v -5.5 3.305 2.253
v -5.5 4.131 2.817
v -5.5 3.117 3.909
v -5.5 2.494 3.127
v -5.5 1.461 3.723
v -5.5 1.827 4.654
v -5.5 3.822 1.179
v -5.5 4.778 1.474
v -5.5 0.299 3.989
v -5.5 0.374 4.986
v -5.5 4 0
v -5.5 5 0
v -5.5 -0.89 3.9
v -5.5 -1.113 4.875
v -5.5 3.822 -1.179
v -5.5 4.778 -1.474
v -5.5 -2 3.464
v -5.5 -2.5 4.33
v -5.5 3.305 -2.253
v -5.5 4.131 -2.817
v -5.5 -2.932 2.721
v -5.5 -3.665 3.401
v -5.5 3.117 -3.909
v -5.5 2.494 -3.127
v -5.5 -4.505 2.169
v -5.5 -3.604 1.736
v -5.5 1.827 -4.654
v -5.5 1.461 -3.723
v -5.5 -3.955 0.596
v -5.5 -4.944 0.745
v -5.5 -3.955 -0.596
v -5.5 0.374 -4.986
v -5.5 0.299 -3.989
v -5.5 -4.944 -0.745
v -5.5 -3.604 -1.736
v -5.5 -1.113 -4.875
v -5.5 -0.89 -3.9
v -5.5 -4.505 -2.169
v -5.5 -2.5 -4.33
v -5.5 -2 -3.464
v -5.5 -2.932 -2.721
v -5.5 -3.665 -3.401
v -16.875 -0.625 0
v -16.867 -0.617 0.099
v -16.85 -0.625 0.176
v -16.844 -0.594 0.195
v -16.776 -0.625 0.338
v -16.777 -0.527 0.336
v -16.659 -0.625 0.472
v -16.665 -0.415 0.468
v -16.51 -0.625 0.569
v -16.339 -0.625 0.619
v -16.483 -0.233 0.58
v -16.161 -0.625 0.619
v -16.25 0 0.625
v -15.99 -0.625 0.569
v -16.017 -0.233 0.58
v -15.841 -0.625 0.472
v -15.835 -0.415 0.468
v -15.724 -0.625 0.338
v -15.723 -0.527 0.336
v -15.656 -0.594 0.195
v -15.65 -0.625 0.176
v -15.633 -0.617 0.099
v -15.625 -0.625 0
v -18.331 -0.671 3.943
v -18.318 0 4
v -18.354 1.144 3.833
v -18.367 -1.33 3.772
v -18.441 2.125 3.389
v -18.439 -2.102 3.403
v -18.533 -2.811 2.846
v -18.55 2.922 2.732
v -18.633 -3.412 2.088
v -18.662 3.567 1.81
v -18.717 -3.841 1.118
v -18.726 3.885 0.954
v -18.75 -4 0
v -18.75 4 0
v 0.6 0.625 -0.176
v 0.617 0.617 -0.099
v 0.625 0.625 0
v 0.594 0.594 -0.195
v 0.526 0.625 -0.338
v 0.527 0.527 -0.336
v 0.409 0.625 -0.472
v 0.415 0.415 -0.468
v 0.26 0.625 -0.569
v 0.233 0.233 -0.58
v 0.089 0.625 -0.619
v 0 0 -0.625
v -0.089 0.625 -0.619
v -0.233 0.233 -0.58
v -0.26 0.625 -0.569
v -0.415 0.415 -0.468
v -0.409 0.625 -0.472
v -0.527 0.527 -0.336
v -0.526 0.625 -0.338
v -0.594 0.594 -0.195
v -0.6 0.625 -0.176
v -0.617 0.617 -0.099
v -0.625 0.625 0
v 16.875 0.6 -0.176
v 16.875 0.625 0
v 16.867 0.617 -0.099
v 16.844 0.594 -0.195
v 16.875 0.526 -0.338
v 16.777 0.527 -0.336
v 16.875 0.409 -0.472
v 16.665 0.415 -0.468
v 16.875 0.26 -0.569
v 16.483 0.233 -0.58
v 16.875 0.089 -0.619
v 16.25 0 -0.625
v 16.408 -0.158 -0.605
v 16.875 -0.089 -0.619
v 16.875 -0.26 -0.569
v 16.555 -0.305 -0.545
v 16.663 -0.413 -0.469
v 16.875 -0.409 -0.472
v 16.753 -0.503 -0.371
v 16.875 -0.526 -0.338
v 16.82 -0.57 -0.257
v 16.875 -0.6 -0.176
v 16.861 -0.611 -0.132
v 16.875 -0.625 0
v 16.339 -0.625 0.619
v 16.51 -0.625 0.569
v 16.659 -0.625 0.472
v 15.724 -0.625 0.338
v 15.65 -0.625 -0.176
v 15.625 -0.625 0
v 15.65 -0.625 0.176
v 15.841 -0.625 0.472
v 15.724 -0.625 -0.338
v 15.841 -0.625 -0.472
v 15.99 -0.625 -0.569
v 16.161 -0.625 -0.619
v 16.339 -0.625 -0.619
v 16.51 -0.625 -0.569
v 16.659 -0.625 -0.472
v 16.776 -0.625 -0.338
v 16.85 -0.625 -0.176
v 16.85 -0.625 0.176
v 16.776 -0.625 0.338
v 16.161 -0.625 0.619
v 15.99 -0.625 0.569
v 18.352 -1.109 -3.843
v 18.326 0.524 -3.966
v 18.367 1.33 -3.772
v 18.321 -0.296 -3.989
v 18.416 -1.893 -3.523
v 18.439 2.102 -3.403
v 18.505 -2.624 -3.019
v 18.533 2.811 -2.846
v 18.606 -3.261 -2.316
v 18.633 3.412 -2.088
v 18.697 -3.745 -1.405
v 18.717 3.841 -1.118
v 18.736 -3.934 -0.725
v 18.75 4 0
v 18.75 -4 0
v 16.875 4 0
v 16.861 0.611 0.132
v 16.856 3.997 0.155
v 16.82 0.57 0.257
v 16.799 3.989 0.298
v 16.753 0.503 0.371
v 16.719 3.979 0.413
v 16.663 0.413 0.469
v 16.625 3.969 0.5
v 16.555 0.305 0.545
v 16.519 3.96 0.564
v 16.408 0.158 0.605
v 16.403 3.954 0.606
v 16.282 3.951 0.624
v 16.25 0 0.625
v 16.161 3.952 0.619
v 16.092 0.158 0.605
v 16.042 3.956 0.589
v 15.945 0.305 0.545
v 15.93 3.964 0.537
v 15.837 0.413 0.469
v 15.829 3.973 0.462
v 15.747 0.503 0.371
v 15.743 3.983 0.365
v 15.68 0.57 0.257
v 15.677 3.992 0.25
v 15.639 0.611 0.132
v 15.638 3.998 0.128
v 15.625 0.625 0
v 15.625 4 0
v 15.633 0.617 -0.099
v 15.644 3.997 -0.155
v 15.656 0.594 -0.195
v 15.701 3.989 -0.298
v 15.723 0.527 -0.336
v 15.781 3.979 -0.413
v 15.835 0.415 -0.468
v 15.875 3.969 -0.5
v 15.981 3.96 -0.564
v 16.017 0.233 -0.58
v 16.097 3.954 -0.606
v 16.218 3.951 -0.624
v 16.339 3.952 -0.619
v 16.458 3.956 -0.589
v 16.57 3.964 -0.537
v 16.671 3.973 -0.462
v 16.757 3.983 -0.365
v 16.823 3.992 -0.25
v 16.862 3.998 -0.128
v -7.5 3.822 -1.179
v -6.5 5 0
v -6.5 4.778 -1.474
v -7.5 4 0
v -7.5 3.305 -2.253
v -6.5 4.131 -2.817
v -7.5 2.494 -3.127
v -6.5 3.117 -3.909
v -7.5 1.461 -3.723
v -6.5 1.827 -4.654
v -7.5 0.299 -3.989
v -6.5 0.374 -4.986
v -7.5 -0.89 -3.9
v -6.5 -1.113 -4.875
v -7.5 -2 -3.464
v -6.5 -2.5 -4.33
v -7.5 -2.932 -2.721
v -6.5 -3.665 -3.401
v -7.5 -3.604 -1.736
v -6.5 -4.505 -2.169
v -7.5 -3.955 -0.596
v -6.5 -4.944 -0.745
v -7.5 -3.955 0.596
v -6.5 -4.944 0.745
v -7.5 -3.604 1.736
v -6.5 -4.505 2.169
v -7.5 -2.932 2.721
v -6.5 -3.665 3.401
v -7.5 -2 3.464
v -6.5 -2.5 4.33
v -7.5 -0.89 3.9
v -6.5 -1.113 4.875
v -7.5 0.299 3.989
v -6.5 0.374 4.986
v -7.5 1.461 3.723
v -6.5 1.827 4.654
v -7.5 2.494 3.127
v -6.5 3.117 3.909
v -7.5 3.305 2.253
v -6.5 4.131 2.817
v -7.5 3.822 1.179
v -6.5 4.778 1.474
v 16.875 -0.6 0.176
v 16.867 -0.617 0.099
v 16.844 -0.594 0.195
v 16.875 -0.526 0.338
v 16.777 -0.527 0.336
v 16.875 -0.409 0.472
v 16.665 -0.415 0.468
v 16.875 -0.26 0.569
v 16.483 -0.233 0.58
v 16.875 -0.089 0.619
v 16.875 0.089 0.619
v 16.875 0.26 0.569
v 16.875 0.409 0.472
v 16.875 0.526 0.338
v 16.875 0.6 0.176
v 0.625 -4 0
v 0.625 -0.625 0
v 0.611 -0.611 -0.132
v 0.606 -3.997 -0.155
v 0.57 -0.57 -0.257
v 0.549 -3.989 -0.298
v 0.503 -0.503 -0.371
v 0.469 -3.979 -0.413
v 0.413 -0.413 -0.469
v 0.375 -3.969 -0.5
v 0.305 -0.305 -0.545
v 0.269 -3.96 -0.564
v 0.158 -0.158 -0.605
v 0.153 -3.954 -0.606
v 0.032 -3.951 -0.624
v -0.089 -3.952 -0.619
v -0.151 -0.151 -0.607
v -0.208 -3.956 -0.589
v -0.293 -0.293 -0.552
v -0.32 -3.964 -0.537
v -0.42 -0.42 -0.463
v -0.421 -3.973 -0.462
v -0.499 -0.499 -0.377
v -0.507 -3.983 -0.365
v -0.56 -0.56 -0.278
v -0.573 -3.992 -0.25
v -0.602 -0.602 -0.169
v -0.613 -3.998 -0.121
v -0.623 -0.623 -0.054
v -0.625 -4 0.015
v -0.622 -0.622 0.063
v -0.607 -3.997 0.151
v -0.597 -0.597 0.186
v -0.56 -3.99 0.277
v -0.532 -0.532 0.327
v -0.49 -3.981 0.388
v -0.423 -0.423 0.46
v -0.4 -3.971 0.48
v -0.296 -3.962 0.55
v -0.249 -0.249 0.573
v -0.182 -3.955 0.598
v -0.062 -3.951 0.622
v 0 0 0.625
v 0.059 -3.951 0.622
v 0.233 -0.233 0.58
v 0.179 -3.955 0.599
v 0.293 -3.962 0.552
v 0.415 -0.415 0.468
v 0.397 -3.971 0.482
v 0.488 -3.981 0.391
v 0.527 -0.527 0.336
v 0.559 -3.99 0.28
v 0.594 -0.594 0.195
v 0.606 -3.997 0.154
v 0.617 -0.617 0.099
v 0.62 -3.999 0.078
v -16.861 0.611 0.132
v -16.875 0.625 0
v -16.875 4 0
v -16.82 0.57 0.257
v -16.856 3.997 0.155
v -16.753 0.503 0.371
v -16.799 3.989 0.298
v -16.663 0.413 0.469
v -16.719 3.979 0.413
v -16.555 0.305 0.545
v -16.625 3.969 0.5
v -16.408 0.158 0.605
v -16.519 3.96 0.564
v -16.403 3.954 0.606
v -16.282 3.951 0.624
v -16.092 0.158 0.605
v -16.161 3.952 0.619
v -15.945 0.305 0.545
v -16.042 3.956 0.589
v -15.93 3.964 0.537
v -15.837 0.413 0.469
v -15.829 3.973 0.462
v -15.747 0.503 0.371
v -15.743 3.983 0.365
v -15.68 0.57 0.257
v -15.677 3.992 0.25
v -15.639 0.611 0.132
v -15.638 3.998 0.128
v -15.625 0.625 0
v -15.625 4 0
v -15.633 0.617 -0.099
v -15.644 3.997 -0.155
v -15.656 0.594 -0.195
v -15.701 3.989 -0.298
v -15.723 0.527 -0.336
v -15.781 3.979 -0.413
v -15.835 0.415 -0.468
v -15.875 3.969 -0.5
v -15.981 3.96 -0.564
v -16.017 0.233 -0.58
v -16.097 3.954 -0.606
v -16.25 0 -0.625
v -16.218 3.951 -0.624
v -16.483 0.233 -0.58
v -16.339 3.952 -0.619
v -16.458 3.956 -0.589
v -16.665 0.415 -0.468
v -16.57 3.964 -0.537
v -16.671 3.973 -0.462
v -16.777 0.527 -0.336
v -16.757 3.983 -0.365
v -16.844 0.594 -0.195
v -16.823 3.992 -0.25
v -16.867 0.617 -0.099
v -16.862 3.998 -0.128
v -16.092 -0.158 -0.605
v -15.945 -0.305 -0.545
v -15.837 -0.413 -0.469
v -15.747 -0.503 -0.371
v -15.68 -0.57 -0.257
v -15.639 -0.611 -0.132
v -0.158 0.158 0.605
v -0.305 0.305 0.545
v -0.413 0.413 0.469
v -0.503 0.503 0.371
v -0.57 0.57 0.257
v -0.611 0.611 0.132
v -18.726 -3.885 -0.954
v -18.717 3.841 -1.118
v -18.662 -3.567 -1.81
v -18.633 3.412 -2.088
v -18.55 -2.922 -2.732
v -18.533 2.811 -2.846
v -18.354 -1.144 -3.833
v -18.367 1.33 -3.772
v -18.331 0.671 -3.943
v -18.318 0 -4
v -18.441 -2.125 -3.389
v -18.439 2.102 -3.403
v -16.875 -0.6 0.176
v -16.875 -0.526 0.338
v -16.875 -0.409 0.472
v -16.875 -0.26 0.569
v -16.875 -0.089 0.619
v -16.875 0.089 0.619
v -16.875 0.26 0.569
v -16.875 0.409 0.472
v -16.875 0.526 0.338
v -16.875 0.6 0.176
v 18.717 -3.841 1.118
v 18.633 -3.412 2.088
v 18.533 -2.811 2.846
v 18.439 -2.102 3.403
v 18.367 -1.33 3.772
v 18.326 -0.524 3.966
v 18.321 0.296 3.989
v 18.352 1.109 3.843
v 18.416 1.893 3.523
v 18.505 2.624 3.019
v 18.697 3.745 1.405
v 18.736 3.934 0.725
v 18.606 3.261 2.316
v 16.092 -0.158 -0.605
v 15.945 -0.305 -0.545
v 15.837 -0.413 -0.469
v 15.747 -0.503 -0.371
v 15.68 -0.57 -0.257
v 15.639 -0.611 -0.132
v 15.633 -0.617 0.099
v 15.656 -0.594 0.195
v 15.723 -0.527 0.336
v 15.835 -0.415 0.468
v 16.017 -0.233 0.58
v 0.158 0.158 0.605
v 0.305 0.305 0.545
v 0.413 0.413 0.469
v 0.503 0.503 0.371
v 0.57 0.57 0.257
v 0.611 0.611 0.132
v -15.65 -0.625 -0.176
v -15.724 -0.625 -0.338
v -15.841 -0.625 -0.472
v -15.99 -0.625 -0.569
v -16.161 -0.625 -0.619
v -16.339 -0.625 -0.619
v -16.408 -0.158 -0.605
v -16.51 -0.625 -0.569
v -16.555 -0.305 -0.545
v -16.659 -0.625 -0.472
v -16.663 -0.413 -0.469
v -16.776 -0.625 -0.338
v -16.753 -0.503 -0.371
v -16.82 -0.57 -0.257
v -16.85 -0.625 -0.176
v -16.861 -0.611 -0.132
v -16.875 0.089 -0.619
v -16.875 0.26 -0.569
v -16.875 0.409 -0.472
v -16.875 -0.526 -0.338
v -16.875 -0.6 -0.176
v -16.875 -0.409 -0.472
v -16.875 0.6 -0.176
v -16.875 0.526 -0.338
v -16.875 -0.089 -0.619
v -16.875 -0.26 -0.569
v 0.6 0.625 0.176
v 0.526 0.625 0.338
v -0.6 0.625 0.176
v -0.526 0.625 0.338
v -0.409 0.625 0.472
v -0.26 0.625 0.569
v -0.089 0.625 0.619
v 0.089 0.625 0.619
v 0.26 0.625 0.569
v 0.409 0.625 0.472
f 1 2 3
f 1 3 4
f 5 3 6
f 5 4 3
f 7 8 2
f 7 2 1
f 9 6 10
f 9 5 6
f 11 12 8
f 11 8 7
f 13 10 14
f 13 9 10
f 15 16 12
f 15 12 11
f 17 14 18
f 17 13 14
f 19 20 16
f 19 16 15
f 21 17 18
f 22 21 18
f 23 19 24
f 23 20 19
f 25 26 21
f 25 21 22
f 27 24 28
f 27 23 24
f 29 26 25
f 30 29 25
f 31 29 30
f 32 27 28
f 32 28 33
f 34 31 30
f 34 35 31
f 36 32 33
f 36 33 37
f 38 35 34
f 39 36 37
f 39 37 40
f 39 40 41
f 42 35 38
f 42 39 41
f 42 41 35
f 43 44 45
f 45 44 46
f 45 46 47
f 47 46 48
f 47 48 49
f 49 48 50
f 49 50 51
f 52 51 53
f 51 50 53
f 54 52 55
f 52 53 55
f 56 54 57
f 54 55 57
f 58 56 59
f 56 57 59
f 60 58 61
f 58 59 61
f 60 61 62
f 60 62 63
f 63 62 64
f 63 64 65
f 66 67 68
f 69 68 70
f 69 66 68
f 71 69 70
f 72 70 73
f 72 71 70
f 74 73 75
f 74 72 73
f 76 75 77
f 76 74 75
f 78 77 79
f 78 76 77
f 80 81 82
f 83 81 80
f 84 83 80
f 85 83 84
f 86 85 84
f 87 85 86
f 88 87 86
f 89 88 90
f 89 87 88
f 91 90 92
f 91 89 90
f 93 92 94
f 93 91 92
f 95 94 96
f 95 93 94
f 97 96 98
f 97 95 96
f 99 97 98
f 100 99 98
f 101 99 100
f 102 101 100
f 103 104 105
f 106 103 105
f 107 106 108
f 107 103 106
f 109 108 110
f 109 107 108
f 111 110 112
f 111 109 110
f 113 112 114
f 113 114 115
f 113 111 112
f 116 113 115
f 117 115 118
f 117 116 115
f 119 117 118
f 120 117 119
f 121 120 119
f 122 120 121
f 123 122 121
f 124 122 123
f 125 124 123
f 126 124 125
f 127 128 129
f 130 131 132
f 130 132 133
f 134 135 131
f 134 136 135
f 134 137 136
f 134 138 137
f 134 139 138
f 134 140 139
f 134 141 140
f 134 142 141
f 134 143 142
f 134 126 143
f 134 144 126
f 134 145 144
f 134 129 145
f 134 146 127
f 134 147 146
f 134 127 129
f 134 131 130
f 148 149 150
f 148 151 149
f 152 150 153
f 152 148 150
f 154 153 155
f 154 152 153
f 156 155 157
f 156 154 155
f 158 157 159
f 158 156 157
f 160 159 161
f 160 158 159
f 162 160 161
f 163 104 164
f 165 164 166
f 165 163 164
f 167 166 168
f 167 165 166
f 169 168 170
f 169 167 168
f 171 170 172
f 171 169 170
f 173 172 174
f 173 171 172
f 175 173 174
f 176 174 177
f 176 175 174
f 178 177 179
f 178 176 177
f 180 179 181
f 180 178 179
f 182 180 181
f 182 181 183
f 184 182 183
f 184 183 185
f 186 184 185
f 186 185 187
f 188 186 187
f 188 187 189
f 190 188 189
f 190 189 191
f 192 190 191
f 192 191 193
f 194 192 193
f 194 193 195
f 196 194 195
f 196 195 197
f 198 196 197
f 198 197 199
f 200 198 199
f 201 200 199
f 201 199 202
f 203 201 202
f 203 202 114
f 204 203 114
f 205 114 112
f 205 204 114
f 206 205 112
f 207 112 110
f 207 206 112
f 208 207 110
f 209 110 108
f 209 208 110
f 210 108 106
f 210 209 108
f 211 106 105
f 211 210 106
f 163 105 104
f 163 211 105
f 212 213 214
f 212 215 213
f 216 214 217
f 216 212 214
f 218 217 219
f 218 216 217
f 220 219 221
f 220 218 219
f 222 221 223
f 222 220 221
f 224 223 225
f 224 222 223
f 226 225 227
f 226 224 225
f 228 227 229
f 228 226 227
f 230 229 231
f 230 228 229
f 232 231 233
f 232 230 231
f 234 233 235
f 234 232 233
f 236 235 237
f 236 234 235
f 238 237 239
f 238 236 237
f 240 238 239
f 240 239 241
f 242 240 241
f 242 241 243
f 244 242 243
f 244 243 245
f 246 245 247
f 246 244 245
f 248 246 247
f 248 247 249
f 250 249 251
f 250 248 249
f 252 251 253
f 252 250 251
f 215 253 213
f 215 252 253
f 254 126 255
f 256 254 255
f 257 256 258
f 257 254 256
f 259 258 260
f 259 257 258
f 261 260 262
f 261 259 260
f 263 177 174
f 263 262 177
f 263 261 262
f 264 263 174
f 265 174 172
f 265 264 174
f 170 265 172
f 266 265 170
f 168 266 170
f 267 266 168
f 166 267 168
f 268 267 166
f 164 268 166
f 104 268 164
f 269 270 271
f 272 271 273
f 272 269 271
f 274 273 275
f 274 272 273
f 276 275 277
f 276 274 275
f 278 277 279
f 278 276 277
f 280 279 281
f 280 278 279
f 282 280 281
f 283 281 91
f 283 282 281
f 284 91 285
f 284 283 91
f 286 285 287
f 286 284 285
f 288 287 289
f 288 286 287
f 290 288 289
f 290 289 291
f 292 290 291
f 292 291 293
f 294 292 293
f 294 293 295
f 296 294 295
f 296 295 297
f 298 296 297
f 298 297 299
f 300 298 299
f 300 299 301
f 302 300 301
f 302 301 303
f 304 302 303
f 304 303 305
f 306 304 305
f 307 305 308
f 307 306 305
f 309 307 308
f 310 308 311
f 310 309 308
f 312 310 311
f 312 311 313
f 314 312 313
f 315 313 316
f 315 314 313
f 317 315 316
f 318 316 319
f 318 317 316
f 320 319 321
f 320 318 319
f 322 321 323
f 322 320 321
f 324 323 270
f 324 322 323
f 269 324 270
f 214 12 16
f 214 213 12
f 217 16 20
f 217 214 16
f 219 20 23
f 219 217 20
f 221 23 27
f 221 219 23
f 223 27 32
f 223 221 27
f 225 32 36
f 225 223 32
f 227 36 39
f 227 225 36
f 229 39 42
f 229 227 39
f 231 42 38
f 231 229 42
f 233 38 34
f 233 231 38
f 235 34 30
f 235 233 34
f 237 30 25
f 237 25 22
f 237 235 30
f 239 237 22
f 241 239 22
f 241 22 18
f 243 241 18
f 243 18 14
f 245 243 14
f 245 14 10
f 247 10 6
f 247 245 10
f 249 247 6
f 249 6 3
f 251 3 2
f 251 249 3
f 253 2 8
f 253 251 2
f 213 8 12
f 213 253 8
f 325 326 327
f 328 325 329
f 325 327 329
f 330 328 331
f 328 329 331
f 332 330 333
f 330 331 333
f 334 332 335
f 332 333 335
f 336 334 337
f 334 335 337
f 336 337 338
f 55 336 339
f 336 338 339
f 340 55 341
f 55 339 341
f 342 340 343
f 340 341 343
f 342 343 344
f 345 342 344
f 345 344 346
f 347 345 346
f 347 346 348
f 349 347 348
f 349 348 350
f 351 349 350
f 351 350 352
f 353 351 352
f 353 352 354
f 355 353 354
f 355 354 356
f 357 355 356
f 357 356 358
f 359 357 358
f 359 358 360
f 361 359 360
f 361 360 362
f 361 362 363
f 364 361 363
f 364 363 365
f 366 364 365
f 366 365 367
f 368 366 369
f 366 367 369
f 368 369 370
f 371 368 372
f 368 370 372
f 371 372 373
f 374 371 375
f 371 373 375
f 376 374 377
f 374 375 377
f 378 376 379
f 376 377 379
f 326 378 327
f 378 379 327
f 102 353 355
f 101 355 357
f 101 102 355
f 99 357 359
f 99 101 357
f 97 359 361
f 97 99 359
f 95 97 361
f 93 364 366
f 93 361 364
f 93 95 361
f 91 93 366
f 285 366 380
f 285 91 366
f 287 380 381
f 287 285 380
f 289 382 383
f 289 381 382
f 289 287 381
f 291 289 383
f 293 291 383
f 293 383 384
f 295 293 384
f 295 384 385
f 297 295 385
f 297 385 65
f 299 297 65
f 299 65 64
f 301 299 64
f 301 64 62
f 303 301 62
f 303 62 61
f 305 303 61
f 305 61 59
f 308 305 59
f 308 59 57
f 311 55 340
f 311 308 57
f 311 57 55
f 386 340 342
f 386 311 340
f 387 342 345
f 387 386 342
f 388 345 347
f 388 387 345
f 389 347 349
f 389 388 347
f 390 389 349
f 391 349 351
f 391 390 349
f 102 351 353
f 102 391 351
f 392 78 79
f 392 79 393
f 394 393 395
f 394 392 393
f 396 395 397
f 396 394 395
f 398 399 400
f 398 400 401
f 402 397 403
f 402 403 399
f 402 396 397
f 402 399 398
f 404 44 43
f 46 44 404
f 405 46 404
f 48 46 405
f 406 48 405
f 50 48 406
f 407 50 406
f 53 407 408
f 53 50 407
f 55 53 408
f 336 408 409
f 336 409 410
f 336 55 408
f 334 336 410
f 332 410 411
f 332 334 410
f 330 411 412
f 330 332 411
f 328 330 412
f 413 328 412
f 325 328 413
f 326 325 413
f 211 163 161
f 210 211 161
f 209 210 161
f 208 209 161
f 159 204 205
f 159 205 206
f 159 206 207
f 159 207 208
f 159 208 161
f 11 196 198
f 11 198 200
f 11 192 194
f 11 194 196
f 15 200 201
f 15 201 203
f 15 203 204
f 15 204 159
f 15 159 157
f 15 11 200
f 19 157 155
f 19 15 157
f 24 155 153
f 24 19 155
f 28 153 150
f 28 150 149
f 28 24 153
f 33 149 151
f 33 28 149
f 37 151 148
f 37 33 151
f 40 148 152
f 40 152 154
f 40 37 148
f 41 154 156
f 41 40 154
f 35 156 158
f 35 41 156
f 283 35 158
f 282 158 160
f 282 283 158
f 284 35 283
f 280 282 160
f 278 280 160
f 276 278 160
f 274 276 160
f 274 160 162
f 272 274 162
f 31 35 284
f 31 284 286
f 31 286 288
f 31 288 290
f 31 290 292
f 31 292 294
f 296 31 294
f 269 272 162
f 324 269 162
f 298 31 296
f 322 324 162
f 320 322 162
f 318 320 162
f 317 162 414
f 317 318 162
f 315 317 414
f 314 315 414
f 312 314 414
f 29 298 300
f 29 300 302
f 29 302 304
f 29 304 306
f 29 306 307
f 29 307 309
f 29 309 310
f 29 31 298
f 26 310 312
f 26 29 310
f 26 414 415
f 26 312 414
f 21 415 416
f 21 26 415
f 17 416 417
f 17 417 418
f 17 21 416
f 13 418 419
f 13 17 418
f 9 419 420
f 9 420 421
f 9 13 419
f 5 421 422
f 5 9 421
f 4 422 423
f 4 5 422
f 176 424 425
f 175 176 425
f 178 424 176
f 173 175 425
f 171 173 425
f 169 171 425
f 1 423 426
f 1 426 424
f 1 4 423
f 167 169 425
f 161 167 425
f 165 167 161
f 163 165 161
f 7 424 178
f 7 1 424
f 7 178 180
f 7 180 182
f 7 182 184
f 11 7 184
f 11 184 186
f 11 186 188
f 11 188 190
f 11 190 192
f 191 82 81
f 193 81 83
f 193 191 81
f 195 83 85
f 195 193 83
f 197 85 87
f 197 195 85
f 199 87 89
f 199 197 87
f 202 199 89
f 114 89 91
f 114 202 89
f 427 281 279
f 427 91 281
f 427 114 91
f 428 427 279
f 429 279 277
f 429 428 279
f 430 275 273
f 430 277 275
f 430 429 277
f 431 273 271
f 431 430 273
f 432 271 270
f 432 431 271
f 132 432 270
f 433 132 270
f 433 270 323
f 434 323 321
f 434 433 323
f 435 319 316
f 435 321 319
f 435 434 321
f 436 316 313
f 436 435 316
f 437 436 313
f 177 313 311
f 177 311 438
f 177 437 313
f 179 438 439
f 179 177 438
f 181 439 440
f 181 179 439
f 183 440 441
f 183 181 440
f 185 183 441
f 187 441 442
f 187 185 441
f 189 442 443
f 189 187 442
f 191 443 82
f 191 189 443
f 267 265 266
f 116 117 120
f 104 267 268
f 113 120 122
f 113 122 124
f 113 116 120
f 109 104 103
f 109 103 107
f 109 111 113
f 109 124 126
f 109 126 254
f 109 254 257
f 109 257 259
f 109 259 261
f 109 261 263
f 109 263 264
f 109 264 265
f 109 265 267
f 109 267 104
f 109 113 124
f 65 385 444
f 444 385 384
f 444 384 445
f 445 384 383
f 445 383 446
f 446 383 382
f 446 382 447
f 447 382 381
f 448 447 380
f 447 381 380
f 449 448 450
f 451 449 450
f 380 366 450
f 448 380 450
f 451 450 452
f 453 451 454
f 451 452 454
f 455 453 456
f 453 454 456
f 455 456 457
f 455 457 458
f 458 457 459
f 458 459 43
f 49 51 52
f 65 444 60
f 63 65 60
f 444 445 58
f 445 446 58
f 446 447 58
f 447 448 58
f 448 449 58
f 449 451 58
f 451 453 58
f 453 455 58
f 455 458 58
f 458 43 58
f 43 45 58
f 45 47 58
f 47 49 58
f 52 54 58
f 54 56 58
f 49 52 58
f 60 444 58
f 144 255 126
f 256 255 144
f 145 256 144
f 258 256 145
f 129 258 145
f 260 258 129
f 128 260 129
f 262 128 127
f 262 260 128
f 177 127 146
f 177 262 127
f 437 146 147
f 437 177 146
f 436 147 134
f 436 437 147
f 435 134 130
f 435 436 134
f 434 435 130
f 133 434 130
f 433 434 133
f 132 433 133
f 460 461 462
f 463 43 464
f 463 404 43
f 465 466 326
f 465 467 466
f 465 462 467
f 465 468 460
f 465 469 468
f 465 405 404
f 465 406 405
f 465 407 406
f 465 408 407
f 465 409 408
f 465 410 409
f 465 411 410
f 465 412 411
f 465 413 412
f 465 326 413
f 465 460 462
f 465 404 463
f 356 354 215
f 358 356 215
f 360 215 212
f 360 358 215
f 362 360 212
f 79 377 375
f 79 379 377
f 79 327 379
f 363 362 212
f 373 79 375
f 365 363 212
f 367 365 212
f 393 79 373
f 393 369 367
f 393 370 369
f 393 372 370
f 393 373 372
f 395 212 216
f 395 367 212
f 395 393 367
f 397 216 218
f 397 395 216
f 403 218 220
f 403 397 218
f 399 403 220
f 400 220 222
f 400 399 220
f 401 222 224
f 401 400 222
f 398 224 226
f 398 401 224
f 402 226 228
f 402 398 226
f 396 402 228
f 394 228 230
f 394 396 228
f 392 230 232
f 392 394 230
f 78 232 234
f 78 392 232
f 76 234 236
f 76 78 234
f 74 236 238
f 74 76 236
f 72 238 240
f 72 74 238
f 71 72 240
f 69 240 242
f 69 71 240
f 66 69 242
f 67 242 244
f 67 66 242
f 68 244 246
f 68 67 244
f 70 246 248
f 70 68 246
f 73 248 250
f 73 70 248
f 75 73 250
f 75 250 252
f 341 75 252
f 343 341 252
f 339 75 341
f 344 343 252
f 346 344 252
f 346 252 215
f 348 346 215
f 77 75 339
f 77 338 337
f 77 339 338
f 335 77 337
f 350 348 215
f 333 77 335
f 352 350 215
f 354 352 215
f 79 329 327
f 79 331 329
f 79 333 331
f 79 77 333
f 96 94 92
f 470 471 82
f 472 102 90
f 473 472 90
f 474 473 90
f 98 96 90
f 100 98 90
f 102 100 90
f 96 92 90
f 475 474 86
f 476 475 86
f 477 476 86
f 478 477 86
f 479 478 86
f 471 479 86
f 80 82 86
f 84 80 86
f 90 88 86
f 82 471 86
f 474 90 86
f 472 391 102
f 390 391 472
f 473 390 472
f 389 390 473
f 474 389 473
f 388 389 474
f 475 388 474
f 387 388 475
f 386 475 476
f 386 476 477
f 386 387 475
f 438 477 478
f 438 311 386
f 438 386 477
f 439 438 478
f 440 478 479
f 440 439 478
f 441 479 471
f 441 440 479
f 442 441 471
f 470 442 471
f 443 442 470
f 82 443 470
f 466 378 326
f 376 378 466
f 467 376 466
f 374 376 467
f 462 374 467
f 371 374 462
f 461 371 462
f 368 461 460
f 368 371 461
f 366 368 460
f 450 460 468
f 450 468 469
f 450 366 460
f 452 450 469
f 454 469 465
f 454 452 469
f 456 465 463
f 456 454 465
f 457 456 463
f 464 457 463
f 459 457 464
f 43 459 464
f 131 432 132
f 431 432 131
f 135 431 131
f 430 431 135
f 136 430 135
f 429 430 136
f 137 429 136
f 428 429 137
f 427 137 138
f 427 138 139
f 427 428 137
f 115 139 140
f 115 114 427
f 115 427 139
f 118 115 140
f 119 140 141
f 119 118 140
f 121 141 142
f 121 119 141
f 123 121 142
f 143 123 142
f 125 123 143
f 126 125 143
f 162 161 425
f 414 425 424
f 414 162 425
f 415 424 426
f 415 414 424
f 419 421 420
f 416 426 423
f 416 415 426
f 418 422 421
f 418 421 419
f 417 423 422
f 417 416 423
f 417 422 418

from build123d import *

# Parameters (mm, degrees)
SKETCH1_3_W             = 0.625
SKETCH1_3_H             = 4.625
SKETCH1_4_W             = 0.625
SKETCH1_4_H             = 4.625
CUT_EXTRUDE1_DEPTH      = 20.584751858
CUT_EXTRUDE1_DEPTH_BACK = 20.584751858


with BuildPart() as part:
    # Sketch1 → Revolve1 (revolve)
    with BuildSketch(Plane.XY):
        Polygon((-18.75, 4), (-18.75, 0), (-16.875, 0), (-16.875, 0.625), (16.875, 0.625), (16.875, 0), (18.75, 0), (18.75, 4), align=None)
    revolve(axis=Axis((0, 0, 0), (-1, 0, 0)))

    # Sketch1<3> → Cut-Revolve1 (revolve, cut)
    with BuildSketch(Plane.XY):
        with Locations((-0.3125, -1.6875)):
            Rectangle(SKETCH1_3_W, SKETCH1_3_H)
    revolve(axis=Axis((0, 0, 0), (0, 1, 0)), mode=Mode.SUBTRACT)

    # Sketch1<4> → Cut-Revolve2 (revolve, cut)
    with BuildSketch(Plane.XY):
        with Locations((16.5625, 1.6875)):
            Rectangle(SKETCH1_4_W, SKETCH1_4_H)
    cut_revolve2 = revolve(axis=Axis((16.25, -0.625, 0), (0, -1, 0)), mode=Mode.SUBTRACT)

    # Mirror1: Cut-Revolve2 across plane
    add(cut_revolve2.mirror(Plane(origin=(0, 0, 0), x_dir=(0, 0, 1), z_dir=(1, 0, 0))), mode=Mode.SUBTRACT)

    # Sketch2 → Cut-Extrude1 (cut, two sides: drawn at the far end of the back side and taken through both)
    with BuildSketch(Plane(origin=(0, 0, 0), x_dir=(1, 0, 0), z_dir=(0, 1, 0)).offset(-CUT_EXTRUDE1_DEPTH_BACK)):
        with BuildLine():
            Line((-18.318365102, 4), (-18.75, 4))
            Line((-18.75, 4), (-18.75, 0))
            ThreePointArc((-18.75, 0), (-18.641778961, 2.011610591), (-18.318365102, 4))
        make_face()
        with BuildLine():
            ThreePointArc((-18.318365102, -4), (-18.641778961, -2.011610591), (-18.75, 0))
            Line((-18.75, 0), (-18.75, -4))
            Line((-18.75, -4), (-18.318365102, -4))
        make_face()
        with BuildLine():
            Line((18.318365102, -4), (18.75, -4))
            Line((18.75, -4), (18.75, 0))
            ThreePointArc((18.75, 0), (18.641778961, -2.011610591), (18.318365102, -4))
        make_face()
        with BuildLine():
            ThreePointArc((18.318365102, 4), (18.641778961, 2.011610591), (18.75, 0))
            Line((18.75, 0), (18.75, 4))
            Line((18.75, 4), (18.318365102, 4))
        make_face()
    extrude(amount=CUT_EXTRUDE1_DEPTH + CUT_EXTRUDE1_DEPTH_BACK, mode=Mode.SUBTRACT)

    # Sketch3 → Revolve2 (revolve)
    with BuildSketch(Plane.XY):
        Polygon((-5.5, 4), (-5.5, 5), (-6.5, 5), (-7.5, 4), align=None)
    revolve(axis=Axis((0, 0, 0), (-1, 0, 0)))


solid = part.part
